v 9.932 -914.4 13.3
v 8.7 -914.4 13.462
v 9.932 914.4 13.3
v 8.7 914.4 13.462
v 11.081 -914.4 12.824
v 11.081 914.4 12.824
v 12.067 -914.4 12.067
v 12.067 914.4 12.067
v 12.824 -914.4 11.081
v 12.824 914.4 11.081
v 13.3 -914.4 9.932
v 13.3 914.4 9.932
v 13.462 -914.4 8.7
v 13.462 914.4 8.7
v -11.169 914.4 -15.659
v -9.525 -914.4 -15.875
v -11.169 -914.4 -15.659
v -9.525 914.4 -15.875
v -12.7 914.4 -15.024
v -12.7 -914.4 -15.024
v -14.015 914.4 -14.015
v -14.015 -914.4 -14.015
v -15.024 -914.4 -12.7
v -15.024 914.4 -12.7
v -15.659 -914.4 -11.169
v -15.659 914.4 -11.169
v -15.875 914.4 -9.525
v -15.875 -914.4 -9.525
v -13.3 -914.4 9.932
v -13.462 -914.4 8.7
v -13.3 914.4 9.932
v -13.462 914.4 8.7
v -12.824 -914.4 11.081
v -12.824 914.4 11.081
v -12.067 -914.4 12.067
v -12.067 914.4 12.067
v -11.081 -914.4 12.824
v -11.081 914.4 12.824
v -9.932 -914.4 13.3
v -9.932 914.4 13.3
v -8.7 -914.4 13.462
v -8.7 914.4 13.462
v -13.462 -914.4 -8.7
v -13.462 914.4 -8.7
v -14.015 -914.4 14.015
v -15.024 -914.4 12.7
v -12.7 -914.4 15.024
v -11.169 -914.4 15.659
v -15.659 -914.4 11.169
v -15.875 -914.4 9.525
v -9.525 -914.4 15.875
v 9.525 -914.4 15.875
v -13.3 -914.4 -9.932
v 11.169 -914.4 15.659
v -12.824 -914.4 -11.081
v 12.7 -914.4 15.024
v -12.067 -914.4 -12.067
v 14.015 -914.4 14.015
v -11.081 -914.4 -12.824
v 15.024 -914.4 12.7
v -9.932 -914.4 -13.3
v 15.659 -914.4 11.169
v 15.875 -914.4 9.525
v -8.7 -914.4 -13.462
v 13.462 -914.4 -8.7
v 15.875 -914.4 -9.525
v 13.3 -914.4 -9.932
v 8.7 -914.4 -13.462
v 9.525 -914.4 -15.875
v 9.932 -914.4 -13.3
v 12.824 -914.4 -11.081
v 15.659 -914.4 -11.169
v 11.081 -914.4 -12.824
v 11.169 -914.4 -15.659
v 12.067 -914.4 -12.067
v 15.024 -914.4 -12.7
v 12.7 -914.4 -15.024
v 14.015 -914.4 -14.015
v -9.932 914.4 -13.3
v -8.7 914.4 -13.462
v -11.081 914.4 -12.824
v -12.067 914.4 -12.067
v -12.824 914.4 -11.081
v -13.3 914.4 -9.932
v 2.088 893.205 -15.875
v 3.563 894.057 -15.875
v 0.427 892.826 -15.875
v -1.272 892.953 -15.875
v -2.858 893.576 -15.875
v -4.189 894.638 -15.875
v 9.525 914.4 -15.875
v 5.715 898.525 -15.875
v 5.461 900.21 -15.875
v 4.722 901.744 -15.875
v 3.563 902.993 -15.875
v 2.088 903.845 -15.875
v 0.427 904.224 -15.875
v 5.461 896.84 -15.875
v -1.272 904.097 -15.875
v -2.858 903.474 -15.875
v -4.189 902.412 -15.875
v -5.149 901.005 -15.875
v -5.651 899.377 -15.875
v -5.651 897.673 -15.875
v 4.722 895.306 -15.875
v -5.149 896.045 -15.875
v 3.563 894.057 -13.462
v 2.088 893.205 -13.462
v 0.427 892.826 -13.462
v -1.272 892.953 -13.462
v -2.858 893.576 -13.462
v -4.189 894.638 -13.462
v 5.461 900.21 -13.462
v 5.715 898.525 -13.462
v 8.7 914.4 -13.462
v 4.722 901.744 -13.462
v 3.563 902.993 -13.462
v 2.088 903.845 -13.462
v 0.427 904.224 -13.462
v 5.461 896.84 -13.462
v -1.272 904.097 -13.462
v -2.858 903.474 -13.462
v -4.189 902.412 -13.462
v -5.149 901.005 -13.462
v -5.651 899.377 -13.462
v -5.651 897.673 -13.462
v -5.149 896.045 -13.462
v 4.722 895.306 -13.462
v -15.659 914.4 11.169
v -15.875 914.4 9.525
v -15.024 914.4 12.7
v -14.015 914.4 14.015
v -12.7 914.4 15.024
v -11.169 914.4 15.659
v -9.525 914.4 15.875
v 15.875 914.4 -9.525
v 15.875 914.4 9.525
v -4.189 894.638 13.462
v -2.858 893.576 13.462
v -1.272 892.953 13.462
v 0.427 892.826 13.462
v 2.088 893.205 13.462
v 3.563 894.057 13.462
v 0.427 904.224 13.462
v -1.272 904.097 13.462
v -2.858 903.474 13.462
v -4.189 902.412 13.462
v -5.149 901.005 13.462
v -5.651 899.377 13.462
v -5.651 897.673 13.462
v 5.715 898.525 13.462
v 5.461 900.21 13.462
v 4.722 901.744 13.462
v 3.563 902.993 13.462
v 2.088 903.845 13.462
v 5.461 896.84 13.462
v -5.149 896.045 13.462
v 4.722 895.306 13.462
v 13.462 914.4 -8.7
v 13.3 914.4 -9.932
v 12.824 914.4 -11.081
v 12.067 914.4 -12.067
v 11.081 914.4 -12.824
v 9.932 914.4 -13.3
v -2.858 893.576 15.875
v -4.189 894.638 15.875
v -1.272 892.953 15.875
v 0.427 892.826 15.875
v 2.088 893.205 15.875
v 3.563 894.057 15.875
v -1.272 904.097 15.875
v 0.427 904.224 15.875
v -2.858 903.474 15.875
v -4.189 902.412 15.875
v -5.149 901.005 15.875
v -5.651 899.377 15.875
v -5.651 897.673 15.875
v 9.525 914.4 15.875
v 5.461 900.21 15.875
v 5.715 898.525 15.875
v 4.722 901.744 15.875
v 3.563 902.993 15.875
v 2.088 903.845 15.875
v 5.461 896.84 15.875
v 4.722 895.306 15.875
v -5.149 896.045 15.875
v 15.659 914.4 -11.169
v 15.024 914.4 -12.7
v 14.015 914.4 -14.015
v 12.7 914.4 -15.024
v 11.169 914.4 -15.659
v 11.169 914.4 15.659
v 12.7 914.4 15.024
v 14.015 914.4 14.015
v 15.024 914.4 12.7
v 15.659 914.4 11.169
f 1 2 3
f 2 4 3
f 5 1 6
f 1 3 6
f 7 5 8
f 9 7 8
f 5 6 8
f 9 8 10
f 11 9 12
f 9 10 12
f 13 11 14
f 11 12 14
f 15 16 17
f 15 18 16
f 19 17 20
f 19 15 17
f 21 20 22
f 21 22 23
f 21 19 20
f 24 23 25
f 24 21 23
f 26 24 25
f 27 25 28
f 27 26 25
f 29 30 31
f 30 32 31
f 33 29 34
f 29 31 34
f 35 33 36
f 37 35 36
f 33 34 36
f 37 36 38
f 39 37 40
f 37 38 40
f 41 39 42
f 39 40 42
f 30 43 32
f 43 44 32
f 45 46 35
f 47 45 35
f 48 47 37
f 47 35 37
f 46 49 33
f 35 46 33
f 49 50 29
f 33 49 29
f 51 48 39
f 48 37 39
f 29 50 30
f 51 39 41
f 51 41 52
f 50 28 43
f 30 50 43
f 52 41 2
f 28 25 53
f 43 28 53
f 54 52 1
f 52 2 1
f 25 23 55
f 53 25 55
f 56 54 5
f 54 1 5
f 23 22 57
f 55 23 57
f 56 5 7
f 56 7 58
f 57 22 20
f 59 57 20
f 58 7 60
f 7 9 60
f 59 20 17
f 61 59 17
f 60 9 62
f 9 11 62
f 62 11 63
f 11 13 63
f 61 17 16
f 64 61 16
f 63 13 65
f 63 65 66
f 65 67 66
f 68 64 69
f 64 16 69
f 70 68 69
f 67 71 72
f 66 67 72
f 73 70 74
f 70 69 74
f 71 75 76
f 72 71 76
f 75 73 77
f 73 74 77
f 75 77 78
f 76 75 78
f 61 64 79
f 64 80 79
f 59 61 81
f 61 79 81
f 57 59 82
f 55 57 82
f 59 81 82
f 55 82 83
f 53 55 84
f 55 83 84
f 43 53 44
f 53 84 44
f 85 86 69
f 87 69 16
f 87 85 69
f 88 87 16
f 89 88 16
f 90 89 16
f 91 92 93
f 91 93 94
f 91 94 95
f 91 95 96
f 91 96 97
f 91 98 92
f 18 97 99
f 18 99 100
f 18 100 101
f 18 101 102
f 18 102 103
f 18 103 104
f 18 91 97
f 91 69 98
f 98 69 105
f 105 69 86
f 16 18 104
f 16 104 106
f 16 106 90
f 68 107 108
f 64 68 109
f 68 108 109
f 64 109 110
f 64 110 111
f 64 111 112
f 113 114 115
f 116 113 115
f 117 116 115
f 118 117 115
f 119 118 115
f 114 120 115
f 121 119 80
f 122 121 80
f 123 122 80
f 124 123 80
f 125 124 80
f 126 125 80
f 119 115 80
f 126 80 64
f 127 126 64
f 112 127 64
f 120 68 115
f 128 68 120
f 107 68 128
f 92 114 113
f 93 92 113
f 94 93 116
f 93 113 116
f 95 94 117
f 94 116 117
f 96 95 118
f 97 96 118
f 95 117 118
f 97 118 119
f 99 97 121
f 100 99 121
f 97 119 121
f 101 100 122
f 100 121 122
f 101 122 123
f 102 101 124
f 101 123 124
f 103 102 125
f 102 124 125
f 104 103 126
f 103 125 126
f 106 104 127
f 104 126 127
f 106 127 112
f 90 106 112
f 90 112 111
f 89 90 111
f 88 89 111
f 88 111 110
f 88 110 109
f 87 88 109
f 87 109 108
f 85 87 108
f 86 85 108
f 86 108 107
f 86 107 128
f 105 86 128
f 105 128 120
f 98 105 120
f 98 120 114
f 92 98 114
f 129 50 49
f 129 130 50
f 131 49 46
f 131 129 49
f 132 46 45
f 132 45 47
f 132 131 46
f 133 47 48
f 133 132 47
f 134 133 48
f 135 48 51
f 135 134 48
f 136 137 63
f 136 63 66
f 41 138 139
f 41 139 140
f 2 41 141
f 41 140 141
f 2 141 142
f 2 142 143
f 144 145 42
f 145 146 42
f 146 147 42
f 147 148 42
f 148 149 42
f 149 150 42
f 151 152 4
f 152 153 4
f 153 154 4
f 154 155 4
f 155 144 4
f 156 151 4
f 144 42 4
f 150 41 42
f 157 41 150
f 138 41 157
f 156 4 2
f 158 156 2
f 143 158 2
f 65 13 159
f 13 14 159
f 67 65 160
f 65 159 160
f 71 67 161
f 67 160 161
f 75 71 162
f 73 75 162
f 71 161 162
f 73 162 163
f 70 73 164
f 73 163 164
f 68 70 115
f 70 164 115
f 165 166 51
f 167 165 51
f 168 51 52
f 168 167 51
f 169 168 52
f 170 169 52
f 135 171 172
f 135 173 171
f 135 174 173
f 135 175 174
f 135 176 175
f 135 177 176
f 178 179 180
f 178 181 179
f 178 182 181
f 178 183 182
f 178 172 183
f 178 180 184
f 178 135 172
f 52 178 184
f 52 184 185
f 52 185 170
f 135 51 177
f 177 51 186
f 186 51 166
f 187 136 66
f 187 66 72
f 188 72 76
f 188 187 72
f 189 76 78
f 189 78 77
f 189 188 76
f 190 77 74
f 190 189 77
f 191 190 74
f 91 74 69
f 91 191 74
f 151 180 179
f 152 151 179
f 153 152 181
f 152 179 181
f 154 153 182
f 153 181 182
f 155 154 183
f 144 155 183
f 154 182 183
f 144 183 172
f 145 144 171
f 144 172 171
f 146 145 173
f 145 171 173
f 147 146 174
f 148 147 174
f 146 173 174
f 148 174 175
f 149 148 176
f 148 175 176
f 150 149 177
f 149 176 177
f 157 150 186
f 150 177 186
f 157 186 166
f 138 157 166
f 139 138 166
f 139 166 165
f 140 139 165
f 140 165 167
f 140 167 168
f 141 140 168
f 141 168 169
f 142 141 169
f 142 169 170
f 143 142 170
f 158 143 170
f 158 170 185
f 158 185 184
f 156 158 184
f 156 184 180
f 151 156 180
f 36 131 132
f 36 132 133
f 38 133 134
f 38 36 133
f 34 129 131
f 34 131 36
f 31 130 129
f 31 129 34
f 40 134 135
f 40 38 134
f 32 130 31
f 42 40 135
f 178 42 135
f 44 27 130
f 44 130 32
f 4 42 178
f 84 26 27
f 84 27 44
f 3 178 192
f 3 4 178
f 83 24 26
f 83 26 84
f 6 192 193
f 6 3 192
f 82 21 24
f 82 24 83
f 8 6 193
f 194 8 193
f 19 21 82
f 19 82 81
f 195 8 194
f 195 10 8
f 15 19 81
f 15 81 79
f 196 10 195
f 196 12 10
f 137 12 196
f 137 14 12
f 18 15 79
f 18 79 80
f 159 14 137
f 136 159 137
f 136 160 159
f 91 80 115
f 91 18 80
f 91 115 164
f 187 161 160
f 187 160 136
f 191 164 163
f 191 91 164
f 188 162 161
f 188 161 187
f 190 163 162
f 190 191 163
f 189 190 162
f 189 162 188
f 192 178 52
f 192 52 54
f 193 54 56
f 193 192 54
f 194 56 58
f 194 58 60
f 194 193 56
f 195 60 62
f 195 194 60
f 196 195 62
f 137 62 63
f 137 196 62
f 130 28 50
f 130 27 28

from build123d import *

# Parameters (mm, degrees)
BOSS_EXTRUDE1_DEPTH = 914.4
SKETCH2_R           = 5.715
CUT_EXTRUDE1_DEPTH  = 32.75


with BuildPart() as part:
    # Sketch1 → Boss-Extrude1 (new body, symmetric)
    with BuildSketch(Plane(origin=(0, 0, 0), x_dir=(1, 0, 0), z_dir=(0, 1, 0))):
        with BuildLine():
            Line((-9.525, -15.875), (9.525, -15.875))
            ThreePointArc((9.525, -15.875), (14.015128061, -14.015128061), (15.875, -9.525))
            Line((15.875, -9.525), (15.875, 9.525))
            ThreePointArc((15.875, 9.525), (14.015128061, 14.015128061), (9.525, 15.875))
            Line((9.525, 15.875), (-9.525, 15.875))
            ThreePointArc((-9.525, 15.875), (-14.015128061, 14.015128061), (-15.875, 9.525))
            Line((-15.875, 9.525), (-15.875, -9.525))
            ThreePointArc((-15.875, -9.525), (-14.015128061, -14.015128061), (-9.525, -15.875))
        make_face()
        with BuildLine():
            Line((-8.6995, -13.462), (8.6995, -13.462))
            ThreePointArc((8.6995, -13.462), (12.067096045, -12.067096045), (13.462, -8.6995))
            Line((13.462, -8.6995), (13.462, 8.6995))
            ThreePointArc((13.462, 8.6995), (12.067096045, 12.067096045), (8.6995, 13.462))
            Line((8.6995, 13.462), (-8.6995, 13.462))
            ThreePointArc((-8.6995, 13.462), (-12.067096045, 12.067096045), (-13.462, 8.6995))
            Line((-13.462, 8.6995), (-13.462, -8.6995))
            ThreePointArc((-13.462, -8.6995), (-12.067096045, -12.067096045), (-8.6995, -13.462))
        make_face(mode=Mode.SUBTRACT)
    extrude(amount=BOSS_EXTRUDE1_DEPTH, both=True)

    # Sketch2 → Cut-Extrude1 (cut, through all)
    with BuildSketch(Plane.XY.offset(15.875)):
        with Locations((0, 898.525)):
            Circle(SKETCH2_R)
    extrude(amount=-CUT_EXTRUDE1_DEPTH, mode=Mode.SUBTRACT)


solid = part.part
